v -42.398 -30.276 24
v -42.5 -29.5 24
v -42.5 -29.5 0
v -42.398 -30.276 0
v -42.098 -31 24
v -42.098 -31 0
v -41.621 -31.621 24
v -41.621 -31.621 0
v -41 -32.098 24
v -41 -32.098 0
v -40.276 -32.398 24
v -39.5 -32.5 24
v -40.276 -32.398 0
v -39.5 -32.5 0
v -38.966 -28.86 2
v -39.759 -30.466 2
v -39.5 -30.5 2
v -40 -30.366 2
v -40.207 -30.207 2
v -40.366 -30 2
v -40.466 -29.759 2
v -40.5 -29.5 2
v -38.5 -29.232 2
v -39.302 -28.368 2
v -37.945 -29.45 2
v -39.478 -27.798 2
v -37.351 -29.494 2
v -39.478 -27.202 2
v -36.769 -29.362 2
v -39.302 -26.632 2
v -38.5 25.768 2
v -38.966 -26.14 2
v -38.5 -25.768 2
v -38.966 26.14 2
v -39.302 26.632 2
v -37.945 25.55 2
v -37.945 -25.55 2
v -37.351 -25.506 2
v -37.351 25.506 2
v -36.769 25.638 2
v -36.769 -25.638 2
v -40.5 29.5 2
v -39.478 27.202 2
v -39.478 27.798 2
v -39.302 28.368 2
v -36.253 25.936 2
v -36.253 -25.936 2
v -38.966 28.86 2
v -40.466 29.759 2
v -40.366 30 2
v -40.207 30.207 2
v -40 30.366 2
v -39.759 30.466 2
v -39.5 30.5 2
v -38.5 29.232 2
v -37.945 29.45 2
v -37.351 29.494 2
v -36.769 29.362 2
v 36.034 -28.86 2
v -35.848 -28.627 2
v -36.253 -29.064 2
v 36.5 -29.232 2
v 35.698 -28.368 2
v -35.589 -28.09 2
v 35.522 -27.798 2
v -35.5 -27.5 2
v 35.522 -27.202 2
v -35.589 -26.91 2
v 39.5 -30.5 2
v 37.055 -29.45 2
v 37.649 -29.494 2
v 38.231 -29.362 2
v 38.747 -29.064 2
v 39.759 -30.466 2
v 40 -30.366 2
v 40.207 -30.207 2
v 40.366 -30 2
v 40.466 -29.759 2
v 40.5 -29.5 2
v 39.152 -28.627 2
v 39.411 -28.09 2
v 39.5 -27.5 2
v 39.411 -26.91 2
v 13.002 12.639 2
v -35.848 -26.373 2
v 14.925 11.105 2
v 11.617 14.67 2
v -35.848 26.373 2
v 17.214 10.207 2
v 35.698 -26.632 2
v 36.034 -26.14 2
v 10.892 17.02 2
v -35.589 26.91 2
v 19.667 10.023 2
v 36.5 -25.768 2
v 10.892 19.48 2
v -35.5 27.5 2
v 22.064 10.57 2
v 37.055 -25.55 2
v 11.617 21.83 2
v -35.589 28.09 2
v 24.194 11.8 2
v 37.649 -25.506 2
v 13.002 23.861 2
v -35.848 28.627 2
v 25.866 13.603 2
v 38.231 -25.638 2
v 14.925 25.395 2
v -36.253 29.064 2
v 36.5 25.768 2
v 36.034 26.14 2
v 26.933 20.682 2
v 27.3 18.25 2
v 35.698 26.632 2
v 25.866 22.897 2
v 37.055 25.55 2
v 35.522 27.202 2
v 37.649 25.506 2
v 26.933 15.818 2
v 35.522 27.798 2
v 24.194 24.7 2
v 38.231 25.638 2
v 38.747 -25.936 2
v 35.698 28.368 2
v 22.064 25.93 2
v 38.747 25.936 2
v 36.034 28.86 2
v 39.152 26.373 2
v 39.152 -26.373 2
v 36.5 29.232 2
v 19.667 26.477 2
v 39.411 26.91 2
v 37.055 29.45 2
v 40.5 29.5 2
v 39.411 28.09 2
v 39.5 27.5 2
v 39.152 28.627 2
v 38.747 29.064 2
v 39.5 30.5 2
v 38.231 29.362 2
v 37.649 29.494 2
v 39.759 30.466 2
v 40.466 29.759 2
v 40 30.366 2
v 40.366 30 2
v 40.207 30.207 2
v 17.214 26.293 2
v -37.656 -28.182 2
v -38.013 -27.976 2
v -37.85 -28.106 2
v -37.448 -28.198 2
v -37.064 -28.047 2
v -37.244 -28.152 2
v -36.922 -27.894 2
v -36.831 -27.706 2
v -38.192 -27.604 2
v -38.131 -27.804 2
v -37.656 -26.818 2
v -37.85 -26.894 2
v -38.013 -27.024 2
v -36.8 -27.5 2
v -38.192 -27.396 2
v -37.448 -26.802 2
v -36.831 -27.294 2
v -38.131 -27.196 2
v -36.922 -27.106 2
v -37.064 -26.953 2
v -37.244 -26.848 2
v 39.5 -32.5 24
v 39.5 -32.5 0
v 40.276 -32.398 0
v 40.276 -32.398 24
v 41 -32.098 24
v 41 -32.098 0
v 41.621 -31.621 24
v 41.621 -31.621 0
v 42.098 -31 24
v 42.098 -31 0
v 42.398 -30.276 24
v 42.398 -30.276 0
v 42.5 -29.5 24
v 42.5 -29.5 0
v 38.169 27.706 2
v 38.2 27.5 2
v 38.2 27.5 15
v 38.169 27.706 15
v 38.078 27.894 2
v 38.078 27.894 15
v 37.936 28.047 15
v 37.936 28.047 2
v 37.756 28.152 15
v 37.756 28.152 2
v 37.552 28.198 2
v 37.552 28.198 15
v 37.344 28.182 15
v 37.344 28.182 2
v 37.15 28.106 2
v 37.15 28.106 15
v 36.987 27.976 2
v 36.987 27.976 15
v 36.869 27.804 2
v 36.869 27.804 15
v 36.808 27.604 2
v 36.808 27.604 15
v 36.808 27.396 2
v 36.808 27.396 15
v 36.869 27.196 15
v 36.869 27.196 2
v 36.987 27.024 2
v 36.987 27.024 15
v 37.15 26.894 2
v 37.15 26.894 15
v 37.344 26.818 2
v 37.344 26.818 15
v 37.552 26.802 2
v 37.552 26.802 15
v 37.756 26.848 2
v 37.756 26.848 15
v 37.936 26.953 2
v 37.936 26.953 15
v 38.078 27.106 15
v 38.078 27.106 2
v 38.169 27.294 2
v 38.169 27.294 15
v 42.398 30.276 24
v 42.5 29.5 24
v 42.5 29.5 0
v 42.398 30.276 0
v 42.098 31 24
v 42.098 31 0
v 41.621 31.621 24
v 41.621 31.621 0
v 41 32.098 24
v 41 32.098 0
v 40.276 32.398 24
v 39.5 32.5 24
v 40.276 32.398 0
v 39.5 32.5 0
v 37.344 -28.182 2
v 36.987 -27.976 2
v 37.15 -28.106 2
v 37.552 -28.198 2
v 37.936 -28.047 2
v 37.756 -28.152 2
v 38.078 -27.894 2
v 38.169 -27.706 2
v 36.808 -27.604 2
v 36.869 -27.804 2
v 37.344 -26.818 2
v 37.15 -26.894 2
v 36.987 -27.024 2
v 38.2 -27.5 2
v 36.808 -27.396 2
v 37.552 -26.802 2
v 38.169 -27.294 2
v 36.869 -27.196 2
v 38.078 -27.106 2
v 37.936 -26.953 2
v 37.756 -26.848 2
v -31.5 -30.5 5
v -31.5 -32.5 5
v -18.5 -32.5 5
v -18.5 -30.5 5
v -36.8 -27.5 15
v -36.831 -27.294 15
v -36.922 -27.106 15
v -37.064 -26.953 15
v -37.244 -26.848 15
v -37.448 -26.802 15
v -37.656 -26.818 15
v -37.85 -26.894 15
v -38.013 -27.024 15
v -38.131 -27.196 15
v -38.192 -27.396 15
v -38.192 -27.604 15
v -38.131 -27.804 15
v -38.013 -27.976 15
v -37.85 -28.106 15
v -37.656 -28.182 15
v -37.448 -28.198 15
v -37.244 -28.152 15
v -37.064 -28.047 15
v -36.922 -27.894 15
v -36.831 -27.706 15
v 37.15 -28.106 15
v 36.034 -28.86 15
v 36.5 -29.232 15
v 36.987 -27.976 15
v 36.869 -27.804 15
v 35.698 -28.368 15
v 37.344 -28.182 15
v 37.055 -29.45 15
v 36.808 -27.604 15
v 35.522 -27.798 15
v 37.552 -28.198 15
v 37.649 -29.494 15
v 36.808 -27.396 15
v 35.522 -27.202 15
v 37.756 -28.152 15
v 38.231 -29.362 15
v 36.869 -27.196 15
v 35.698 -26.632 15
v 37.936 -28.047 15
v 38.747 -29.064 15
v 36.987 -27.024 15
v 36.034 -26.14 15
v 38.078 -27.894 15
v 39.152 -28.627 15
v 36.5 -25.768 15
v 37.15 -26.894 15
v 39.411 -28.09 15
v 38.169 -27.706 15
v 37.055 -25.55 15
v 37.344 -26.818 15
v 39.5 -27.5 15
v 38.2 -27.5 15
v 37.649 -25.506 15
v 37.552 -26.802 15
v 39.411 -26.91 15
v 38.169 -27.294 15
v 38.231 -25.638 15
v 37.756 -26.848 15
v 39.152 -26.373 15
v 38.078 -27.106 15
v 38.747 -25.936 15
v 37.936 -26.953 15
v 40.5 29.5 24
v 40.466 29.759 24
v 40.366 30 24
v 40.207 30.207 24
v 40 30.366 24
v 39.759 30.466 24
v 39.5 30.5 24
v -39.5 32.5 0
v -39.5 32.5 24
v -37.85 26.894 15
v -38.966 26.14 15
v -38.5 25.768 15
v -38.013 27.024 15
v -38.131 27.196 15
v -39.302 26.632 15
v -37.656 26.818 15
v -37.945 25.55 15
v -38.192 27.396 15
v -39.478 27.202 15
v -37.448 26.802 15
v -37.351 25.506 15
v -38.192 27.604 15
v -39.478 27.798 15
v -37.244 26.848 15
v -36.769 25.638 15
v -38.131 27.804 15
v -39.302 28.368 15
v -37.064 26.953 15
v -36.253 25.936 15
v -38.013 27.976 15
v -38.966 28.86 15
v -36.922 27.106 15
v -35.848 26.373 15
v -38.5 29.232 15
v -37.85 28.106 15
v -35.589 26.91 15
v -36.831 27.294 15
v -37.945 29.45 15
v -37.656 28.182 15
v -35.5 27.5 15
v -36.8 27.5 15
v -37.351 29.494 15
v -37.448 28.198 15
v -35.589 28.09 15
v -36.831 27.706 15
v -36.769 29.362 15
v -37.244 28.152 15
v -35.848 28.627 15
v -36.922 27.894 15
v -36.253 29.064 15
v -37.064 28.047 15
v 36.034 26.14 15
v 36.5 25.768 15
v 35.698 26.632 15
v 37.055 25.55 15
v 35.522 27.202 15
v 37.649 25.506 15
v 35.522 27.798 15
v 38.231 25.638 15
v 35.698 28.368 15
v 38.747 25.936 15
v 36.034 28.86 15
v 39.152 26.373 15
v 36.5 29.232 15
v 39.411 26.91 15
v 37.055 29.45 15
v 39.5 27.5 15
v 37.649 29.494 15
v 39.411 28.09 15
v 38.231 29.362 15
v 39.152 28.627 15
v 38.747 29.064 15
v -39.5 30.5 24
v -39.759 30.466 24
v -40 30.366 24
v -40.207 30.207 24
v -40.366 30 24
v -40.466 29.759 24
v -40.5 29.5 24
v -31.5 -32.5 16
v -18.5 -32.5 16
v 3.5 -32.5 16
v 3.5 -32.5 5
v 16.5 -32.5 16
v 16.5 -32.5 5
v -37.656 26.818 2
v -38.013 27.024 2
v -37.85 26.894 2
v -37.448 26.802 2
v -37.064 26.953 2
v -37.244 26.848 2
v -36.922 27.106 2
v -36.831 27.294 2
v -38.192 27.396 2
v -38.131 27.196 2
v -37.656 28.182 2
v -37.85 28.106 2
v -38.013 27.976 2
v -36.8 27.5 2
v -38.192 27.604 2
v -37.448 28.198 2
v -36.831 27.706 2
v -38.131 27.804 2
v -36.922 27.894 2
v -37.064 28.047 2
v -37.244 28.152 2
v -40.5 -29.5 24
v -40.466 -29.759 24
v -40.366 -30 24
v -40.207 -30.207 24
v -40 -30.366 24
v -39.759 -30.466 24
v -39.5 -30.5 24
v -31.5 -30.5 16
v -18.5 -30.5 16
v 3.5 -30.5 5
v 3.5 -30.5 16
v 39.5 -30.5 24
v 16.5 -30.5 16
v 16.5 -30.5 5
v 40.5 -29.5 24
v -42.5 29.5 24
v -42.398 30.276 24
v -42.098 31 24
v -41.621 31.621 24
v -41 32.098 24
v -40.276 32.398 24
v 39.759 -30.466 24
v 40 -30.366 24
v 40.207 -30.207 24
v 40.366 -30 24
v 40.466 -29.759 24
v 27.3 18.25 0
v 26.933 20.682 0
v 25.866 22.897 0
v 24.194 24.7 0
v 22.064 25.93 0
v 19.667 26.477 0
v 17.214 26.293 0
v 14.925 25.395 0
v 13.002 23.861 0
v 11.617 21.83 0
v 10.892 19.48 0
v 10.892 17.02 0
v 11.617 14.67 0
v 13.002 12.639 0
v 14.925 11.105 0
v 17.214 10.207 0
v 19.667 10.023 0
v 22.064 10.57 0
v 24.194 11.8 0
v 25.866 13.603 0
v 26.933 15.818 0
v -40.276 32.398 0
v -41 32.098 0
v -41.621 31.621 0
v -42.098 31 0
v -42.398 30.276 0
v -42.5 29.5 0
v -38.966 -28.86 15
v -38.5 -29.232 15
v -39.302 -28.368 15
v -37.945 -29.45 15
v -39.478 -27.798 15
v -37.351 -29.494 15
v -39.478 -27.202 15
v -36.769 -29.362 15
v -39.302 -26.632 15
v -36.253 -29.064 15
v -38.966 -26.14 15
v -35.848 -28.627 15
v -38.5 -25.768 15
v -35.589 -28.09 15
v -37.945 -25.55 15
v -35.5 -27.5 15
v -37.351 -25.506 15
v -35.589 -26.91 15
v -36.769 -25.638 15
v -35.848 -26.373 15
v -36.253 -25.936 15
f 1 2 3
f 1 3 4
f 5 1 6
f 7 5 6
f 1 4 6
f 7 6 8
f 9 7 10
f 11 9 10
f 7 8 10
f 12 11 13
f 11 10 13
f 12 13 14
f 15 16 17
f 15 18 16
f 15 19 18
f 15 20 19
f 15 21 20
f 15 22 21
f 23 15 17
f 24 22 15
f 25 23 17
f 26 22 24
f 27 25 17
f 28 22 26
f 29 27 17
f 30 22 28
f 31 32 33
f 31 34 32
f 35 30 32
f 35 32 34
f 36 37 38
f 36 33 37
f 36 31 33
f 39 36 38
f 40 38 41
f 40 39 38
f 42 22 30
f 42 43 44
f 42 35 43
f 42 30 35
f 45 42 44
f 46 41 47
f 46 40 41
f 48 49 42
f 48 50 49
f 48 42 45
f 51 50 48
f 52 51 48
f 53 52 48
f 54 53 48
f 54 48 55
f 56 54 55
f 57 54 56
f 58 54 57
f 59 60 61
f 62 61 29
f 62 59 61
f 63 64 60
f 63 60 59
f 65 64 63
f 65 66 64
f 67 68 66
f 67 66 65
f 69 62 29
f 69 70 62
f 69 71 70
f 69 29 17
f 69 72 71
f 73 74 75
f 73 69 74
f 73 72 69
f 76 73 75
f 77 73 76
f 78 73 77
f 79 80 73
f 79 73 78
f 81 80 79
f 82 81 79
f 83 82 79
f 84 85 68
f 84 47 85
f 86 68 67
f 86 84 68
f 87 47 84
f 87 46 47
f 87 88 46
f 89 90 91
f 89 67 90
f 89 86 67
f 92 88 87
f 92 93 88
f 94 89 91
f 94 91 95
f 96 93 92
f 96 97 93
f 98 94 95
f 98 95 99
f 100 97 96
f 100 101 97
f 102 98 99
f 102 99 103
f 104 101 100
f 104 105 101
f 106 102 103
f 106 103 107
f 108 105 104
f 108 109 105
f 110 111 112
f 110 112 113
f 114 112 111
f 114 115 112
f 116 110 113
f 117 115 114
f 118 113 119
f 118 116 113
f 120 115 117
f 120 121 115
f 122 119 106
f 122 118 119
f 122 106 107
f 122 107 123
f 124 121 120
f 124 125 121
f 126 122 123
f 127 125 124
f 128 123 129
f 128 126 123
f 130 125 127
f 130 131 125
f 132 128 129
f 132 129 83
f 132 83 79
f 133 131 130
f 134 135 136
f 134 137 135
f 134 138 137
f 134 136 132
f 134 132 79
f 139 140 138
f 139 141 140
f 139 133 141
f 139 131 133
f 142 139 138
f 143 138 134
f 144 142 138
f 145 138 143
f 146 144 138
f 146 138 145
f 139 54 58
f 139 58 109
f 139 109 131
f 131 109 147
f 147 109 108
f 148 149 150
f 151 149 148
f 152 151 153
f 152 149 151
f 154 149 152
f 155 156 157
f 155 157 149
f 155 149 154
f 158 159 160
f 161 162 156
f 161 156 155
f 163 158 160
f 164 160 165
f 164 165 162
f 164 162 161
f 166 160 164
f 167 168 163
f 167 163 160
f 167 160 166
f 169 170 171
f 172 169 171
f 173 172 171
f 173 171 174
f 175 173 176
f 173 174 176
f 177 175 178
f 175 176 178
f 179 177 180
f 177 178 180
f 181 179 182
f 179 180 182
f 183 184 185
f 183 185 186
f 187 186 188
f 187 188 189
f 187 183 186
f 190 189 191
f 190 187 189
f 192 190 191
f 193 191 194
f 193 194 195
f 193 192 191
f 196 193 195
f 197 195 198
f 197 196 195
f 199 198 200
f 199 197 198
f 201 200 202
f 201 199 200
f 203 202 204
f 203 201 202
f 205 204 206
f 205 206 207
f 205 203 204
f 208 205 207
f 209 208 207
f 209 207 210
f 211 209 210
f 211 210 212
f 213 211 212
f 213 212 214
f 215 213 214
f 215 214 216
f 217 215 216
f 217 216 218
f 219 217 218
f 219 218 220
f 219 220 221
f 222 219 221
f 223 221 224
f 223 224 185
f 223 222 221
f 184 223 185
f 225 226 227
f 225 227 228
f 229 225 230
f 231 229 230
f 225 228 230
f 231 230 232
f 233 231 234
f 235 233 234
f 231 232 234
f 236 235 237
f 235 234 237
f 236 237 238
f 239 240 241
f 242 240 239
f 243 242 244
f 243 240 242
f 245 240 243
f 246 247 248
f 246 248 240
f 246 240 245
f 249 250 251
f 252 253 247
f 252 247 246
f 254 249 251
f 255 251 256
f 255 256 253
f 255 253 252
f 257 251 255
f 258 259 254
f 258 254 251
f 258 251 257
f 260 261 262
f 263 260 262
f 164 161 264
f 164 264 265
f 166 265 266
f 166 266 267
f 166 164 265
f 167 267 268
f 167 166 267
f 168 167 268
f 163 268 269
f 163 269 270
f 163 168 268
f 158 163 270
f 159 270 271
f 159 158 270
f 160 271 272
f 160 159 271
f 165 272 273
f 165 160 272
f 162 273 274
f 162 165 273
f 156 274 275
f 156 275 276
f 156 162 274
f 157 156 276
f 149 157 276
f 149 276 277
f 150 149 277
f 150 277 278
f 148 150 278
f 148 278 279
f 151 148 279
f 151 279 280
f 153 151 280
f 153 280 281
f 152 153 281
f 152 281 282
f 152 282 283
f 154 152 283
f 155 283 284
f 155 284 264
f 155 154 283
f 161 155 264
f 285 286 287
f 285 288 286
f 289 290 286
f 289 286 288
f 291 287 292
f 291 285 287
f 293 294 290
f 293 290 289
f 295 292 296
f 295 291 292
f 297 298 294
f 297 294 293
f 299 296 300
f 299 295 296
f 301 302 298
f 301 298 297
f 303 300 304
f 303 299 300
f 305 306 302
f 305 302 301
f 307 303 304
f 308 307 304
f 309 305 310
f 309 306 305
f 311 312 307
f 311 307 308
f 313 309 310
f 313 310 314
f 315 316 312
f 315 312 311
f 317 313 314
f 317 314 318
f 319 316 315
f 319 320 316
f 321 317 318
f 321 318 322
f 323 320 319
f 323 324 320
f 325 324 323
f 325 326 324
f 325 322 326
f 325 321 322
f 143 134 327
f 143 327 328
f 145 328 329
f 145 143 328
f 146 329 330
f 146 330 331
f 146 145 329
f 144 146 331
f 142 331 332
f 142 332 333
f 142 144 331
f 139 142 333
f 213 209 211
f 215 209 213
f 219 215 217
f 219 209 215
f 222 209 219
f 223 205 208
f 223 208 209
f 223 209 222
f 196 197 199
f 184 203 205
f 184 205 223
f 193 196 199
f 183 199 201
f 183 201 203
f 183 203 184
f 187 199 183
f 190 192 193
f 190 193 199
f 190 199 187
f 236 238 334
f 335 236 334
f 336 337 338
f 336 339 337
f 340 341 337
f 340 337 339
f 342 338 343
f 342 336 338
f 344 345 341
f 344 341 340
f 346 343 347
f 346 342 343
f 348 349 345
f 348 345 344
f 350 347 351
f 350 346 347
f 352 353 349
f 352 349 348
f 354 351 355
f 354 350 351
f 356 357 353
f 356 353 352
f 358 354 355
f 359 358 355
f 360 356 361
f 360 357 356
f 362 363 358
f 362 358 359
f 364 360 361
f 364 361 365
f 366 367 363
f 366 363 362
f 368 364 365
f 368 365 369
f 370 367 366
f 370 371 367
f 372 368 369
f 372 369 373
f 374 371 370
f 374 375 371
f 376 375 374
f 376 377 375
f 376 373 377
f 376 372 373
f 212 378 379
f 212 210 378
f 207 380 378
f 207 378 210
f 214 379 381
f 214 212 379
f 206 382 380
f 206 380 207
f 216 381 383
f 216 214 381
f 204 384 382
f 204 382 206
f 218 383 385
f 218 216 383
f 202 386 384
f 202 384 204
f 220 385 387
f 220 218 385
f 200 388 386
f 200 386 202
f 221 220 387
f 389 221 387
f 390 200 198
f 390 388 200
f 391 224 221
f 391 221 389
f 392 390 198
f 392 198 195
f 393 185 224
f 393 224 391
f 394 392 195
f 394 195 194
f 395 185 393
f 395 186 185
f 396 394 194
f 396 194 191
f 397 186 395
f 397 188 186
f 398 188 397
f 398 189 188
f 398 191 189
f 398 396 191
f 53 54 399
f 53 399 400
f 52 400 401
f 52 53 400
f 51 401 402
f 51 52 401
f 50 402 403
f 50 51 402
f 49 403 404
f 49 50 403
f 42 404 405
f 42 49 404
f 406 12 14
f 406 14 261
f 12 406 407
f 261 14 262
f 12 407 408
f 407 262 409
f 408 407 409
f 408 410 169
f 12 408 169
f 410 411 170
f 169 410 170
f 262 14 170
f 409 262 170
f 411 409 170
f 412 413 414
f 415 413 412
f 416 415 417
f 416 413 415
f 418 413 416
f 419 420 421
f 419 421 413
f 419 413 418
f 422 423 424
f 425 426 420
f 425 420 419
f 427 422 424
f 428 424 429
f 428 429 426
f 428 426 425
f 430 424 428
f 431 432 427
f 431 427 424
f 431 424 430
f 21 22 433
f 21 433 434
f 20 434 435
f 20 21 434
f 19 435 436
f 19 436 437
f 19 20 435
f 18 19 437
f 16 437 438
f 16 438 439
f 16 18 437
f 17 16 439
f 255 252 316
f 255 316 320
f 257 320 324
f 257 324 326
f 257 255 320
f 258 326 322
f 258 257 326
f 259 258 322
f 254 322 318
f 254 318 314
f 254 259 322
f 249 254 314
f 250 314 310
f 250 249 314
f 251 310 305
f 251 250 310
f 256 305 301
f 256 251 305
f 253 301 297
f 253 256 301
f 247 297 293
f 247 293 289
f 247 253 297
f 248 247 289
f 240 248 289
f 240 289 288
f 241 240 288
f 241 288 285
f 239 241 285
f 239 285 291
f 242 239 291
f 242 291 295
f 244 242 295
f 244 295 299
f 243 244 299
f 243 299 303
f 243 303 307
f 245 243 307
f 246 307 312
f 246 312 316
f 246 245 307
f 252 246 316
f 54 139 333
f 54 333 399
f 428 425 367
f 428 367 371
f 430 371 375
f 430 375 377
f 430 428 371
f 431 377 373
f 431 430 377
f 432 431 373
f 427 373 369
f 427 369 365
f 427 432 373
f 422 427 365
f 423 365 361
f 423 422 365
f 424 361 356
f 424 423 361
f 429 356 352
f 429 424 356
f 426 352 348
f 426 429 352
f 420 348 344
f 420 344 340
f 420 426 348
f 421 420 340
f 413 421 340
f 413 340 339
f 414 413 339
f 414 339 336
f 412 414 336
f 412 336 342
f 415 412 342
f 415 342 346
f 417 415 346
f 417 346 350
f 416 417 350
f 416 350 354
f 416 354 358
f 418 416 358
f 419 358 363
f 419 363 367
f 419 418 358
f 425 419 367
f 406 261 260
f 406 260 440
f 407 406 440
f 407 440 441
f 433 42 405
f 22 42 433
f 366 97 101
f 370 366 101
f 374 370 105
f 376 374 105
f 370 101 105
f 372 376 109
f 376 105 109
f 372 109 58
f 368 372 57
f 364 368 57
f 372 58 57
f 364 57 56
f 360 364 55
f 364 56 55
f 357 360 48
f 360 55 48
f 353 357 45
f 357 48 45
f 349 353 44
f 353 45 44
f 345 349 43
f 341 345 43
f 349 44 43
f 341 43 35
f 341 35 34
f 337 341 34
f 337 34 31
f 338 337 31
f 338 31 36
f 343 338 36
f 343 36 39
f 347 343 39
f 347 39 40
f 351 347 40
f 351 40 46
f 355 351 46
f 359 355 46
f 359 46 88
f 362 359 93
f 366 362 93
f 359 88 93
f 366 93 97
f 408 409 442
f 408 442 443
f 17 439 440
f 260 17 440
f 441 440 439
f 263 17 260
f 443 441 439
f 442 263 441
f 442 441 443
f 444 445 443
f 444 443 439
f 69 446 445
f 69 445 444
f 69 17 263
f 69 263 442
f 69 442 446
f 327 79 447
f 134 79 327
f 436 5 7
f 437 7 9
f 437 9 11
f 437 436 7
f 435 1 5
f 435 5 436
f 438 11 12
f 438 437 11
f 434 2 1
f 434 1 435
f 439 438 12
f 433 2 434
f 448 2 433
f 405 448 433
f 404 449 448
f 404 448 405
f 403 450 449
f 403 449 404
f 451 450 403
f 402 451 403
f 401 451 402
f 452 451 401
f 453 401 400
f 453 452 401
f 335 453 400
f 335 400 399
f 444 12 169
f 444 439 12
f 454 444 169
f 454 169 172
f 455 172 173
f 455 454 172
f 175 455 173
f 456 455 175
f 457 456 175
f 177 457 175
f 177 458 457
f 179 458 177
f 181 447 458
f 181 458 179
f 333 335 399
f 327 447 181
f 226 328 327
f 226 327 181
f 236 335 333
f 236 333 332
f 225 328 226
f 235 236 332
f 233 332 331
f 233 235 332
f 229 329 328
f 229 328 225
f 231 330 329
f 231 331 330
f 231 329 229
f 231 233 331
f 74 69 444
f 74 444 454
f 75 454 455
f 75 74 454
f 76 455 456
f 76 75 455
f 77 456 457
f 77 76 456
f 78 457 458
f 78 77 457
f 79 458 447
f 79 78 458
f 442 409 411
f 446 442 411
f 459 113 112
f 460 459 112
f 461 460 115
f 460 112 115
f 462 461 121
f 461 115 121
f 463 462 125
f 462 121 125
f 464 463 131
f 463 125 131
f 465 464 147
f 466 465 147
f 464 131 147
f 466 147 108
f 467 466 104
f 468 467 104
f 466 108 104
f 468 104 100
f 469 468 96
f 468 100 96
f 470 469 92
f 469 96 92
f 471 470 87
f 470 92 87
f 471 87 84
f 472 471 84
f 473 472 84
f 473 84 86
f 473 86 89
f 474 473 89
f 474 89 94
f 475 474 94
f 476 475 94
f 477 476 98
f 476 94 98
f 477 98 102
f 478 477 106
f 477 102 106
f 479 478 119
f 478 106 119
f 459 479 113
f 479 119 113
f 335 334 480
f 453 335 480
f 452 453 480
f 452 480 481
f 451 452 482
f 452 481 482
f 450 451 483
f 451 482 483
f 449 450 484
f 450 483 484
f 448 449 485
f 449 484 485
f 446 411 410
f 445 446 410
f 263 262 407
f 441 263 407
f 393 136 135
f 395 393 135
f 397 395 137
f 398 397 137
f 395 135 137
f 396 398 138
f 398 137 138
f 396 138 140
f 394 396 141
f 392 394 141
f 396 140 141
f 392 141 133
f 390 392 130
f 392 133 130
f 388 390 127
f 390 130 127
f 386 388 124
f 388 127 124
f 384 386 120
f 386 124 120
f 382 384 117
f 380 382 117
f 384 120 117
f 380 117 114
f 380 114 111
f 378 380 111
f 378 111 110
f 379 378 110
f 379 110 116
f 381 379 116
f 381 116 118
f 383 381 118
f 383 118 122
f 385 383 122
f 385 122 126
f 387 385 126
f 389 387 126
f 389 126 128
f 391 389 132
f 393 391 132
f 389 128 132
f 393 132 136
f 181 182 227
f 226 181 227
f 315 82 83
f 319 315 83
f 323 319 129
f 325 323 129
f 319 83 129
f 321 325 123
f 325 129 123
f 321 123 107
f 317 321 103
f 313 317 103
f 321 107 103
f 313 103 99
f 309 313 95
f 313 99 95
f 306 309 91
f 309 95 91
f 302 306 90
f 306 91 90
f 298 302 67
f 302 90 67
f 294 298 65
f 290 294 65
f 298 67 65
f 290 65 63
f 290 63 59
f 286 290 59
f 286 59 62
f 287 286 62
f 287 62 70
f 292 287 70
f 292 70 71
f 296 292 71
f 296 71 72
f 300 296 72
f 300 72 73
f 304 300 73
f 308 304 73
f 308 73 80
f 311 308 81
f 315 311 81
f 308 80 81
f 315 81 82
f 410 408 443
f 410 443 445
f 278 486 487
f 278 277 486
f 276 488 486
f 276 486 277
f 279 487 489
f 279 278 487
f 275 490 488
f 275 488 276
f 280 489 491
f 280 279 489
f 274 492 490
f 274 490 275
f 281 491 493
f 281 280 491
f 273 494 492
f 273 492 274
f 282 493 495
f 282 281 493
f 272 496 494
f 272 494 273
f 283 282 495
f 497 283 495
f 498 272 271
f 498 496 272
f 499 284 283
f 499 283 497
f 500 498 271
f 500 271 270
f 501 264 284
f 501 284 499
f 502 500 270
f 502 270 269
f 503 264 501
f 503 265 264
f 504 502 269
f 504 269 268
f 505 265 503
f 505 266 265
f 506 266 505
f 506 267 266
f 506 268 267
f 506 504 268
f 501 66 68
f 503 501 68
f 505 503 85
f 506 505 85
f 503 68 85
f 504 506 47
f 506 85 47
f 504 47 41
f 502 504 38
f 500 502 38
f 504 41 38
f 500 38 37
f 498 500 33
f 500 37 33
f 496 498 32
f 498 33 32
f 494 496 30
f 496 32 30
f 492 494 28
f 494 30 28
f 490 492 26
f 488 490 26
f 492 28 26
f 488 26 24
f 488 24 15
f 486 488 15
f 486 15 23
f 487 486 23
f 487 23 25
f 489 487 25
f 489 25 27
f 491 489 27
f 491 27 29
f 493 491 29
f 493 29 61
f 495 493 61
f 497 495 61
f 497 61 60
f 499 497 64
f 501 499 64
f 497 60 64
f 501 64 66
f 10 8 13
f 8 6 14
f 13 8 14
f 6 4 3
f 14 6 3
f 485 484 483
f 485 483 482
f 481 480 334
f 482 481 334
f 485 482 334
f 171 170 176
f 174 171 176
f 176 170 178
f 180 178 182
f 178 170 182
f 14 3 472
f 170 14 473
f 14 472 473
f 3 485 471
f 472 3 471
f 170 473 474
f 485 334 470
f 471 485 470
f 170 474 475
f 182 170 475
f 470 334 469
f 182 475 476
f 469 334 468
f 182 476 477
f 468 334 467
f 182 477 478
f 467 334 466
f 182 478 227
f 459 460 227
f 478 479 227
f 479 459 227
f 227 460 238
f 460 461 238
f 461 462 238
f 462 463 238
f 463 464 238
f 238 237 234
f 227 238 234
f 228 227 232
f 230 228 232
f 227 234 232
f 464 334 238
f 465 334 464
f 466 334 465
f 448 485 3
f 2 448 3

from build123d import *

# Parameters (mm, degrees)
F1_DEPTH = 24
F2_T     = -2
F3_R     = 8.25
F4_DEPTH = 2
F5_R     = 2
F5_R_2   = 0.7
F6_DEPTH = 13
F7_W     = 13
F7_H     = 11
F8_DEPTH = 2


with BuildPart() as f1:
    # F0 (on Top) → F1 (new body)
    with BuildSketch(Plane.XY):
        with BuildLine():
            ThreePointArc((42.5, 29.5), (41.6213203436, 31.6213203436), (39.5, 32.5))
            Line((39.5, 32.5), (-39.5, 32.5))
            ThreePointArc((-39.5, 32.5), (-41.6213203436, 31.6213203436), (-42.5, 29.5))
            Line((-42.5, 29.5), (-42.5, -29.5))
            ThreePointArc((-42.5, -29.5), (-41.6213203436, -31.6213203436), (-39.5, -32.5))
            Line((-39.5, -32.5), (39.5, -32.5))
            ThreePointArc((39.5, -32.5), (41.6213203436, -31.6213203436), (42.5, -29.5))
            Line((42.5, -29.5), (42.5, 29.5))
        make_face()
    extrude(amount=F1_DEPTH)

    # F2
    f2_openings = [f1.faces().sort_by_distance(p)[0] for p in [
        (0, 0, 24),
    ]]
    offset(amount=F2_T, openings=f2_openings)

    # F3 (on face) → F4 (cut, through all)
    with BuildSketch(Plane.XY.offset(2)):
        with Locations((19.05, 18.25)):
            Circle(F3_R)
    extrude(amount=-F4_DEPTH, mode=Mode.SUBTRACT)

    # F5 (on face) → F6 (join)
    with BuildSketch(Plane.XY.offset(2)):
        with Locations((-37.5, 27.5)):
            Circle(F5_R)
        with Locations((-37.5, 27.5)):
            Circle(F5_R_2, mode=Mode.SUBTRACT)
        with Locations((37.5, 27.5)):
            Circle(F5_R)
        with Locations((37.5, 27.5)):
            Circle(F5_R_2, mode=Mode.SUBTRACT)
        with Locations((37.5, -27.5)):
            Circle(F5_R)
        with Locations((37.5, -27.5)):
            Circle(F5_R_2, mode=Mode.SUBTRACT)
        with Locations((-37.5, -27.5)):
            Circle(F5_R)
        with Locations((-37.5, -27.5)):
            Circle(F5_R_2, mode=Mode.SUBTRACT)
    extrude(amount=F6_DEPTH)

    # F7 (on face) → F8 (cut, through all)
    with BuildSketch(Plane.XZ.offset(32.5)):
        with Locations((10, 10.5)):
            Rectangle(F7_W, F7_H)
        with Locations((-25, 10.5)):
            Rectangle(F7_W, F7_H)
    extrude(amount=-F8_DEPTH, mode=Mode.SUBTRACT)


solid = f1.part
